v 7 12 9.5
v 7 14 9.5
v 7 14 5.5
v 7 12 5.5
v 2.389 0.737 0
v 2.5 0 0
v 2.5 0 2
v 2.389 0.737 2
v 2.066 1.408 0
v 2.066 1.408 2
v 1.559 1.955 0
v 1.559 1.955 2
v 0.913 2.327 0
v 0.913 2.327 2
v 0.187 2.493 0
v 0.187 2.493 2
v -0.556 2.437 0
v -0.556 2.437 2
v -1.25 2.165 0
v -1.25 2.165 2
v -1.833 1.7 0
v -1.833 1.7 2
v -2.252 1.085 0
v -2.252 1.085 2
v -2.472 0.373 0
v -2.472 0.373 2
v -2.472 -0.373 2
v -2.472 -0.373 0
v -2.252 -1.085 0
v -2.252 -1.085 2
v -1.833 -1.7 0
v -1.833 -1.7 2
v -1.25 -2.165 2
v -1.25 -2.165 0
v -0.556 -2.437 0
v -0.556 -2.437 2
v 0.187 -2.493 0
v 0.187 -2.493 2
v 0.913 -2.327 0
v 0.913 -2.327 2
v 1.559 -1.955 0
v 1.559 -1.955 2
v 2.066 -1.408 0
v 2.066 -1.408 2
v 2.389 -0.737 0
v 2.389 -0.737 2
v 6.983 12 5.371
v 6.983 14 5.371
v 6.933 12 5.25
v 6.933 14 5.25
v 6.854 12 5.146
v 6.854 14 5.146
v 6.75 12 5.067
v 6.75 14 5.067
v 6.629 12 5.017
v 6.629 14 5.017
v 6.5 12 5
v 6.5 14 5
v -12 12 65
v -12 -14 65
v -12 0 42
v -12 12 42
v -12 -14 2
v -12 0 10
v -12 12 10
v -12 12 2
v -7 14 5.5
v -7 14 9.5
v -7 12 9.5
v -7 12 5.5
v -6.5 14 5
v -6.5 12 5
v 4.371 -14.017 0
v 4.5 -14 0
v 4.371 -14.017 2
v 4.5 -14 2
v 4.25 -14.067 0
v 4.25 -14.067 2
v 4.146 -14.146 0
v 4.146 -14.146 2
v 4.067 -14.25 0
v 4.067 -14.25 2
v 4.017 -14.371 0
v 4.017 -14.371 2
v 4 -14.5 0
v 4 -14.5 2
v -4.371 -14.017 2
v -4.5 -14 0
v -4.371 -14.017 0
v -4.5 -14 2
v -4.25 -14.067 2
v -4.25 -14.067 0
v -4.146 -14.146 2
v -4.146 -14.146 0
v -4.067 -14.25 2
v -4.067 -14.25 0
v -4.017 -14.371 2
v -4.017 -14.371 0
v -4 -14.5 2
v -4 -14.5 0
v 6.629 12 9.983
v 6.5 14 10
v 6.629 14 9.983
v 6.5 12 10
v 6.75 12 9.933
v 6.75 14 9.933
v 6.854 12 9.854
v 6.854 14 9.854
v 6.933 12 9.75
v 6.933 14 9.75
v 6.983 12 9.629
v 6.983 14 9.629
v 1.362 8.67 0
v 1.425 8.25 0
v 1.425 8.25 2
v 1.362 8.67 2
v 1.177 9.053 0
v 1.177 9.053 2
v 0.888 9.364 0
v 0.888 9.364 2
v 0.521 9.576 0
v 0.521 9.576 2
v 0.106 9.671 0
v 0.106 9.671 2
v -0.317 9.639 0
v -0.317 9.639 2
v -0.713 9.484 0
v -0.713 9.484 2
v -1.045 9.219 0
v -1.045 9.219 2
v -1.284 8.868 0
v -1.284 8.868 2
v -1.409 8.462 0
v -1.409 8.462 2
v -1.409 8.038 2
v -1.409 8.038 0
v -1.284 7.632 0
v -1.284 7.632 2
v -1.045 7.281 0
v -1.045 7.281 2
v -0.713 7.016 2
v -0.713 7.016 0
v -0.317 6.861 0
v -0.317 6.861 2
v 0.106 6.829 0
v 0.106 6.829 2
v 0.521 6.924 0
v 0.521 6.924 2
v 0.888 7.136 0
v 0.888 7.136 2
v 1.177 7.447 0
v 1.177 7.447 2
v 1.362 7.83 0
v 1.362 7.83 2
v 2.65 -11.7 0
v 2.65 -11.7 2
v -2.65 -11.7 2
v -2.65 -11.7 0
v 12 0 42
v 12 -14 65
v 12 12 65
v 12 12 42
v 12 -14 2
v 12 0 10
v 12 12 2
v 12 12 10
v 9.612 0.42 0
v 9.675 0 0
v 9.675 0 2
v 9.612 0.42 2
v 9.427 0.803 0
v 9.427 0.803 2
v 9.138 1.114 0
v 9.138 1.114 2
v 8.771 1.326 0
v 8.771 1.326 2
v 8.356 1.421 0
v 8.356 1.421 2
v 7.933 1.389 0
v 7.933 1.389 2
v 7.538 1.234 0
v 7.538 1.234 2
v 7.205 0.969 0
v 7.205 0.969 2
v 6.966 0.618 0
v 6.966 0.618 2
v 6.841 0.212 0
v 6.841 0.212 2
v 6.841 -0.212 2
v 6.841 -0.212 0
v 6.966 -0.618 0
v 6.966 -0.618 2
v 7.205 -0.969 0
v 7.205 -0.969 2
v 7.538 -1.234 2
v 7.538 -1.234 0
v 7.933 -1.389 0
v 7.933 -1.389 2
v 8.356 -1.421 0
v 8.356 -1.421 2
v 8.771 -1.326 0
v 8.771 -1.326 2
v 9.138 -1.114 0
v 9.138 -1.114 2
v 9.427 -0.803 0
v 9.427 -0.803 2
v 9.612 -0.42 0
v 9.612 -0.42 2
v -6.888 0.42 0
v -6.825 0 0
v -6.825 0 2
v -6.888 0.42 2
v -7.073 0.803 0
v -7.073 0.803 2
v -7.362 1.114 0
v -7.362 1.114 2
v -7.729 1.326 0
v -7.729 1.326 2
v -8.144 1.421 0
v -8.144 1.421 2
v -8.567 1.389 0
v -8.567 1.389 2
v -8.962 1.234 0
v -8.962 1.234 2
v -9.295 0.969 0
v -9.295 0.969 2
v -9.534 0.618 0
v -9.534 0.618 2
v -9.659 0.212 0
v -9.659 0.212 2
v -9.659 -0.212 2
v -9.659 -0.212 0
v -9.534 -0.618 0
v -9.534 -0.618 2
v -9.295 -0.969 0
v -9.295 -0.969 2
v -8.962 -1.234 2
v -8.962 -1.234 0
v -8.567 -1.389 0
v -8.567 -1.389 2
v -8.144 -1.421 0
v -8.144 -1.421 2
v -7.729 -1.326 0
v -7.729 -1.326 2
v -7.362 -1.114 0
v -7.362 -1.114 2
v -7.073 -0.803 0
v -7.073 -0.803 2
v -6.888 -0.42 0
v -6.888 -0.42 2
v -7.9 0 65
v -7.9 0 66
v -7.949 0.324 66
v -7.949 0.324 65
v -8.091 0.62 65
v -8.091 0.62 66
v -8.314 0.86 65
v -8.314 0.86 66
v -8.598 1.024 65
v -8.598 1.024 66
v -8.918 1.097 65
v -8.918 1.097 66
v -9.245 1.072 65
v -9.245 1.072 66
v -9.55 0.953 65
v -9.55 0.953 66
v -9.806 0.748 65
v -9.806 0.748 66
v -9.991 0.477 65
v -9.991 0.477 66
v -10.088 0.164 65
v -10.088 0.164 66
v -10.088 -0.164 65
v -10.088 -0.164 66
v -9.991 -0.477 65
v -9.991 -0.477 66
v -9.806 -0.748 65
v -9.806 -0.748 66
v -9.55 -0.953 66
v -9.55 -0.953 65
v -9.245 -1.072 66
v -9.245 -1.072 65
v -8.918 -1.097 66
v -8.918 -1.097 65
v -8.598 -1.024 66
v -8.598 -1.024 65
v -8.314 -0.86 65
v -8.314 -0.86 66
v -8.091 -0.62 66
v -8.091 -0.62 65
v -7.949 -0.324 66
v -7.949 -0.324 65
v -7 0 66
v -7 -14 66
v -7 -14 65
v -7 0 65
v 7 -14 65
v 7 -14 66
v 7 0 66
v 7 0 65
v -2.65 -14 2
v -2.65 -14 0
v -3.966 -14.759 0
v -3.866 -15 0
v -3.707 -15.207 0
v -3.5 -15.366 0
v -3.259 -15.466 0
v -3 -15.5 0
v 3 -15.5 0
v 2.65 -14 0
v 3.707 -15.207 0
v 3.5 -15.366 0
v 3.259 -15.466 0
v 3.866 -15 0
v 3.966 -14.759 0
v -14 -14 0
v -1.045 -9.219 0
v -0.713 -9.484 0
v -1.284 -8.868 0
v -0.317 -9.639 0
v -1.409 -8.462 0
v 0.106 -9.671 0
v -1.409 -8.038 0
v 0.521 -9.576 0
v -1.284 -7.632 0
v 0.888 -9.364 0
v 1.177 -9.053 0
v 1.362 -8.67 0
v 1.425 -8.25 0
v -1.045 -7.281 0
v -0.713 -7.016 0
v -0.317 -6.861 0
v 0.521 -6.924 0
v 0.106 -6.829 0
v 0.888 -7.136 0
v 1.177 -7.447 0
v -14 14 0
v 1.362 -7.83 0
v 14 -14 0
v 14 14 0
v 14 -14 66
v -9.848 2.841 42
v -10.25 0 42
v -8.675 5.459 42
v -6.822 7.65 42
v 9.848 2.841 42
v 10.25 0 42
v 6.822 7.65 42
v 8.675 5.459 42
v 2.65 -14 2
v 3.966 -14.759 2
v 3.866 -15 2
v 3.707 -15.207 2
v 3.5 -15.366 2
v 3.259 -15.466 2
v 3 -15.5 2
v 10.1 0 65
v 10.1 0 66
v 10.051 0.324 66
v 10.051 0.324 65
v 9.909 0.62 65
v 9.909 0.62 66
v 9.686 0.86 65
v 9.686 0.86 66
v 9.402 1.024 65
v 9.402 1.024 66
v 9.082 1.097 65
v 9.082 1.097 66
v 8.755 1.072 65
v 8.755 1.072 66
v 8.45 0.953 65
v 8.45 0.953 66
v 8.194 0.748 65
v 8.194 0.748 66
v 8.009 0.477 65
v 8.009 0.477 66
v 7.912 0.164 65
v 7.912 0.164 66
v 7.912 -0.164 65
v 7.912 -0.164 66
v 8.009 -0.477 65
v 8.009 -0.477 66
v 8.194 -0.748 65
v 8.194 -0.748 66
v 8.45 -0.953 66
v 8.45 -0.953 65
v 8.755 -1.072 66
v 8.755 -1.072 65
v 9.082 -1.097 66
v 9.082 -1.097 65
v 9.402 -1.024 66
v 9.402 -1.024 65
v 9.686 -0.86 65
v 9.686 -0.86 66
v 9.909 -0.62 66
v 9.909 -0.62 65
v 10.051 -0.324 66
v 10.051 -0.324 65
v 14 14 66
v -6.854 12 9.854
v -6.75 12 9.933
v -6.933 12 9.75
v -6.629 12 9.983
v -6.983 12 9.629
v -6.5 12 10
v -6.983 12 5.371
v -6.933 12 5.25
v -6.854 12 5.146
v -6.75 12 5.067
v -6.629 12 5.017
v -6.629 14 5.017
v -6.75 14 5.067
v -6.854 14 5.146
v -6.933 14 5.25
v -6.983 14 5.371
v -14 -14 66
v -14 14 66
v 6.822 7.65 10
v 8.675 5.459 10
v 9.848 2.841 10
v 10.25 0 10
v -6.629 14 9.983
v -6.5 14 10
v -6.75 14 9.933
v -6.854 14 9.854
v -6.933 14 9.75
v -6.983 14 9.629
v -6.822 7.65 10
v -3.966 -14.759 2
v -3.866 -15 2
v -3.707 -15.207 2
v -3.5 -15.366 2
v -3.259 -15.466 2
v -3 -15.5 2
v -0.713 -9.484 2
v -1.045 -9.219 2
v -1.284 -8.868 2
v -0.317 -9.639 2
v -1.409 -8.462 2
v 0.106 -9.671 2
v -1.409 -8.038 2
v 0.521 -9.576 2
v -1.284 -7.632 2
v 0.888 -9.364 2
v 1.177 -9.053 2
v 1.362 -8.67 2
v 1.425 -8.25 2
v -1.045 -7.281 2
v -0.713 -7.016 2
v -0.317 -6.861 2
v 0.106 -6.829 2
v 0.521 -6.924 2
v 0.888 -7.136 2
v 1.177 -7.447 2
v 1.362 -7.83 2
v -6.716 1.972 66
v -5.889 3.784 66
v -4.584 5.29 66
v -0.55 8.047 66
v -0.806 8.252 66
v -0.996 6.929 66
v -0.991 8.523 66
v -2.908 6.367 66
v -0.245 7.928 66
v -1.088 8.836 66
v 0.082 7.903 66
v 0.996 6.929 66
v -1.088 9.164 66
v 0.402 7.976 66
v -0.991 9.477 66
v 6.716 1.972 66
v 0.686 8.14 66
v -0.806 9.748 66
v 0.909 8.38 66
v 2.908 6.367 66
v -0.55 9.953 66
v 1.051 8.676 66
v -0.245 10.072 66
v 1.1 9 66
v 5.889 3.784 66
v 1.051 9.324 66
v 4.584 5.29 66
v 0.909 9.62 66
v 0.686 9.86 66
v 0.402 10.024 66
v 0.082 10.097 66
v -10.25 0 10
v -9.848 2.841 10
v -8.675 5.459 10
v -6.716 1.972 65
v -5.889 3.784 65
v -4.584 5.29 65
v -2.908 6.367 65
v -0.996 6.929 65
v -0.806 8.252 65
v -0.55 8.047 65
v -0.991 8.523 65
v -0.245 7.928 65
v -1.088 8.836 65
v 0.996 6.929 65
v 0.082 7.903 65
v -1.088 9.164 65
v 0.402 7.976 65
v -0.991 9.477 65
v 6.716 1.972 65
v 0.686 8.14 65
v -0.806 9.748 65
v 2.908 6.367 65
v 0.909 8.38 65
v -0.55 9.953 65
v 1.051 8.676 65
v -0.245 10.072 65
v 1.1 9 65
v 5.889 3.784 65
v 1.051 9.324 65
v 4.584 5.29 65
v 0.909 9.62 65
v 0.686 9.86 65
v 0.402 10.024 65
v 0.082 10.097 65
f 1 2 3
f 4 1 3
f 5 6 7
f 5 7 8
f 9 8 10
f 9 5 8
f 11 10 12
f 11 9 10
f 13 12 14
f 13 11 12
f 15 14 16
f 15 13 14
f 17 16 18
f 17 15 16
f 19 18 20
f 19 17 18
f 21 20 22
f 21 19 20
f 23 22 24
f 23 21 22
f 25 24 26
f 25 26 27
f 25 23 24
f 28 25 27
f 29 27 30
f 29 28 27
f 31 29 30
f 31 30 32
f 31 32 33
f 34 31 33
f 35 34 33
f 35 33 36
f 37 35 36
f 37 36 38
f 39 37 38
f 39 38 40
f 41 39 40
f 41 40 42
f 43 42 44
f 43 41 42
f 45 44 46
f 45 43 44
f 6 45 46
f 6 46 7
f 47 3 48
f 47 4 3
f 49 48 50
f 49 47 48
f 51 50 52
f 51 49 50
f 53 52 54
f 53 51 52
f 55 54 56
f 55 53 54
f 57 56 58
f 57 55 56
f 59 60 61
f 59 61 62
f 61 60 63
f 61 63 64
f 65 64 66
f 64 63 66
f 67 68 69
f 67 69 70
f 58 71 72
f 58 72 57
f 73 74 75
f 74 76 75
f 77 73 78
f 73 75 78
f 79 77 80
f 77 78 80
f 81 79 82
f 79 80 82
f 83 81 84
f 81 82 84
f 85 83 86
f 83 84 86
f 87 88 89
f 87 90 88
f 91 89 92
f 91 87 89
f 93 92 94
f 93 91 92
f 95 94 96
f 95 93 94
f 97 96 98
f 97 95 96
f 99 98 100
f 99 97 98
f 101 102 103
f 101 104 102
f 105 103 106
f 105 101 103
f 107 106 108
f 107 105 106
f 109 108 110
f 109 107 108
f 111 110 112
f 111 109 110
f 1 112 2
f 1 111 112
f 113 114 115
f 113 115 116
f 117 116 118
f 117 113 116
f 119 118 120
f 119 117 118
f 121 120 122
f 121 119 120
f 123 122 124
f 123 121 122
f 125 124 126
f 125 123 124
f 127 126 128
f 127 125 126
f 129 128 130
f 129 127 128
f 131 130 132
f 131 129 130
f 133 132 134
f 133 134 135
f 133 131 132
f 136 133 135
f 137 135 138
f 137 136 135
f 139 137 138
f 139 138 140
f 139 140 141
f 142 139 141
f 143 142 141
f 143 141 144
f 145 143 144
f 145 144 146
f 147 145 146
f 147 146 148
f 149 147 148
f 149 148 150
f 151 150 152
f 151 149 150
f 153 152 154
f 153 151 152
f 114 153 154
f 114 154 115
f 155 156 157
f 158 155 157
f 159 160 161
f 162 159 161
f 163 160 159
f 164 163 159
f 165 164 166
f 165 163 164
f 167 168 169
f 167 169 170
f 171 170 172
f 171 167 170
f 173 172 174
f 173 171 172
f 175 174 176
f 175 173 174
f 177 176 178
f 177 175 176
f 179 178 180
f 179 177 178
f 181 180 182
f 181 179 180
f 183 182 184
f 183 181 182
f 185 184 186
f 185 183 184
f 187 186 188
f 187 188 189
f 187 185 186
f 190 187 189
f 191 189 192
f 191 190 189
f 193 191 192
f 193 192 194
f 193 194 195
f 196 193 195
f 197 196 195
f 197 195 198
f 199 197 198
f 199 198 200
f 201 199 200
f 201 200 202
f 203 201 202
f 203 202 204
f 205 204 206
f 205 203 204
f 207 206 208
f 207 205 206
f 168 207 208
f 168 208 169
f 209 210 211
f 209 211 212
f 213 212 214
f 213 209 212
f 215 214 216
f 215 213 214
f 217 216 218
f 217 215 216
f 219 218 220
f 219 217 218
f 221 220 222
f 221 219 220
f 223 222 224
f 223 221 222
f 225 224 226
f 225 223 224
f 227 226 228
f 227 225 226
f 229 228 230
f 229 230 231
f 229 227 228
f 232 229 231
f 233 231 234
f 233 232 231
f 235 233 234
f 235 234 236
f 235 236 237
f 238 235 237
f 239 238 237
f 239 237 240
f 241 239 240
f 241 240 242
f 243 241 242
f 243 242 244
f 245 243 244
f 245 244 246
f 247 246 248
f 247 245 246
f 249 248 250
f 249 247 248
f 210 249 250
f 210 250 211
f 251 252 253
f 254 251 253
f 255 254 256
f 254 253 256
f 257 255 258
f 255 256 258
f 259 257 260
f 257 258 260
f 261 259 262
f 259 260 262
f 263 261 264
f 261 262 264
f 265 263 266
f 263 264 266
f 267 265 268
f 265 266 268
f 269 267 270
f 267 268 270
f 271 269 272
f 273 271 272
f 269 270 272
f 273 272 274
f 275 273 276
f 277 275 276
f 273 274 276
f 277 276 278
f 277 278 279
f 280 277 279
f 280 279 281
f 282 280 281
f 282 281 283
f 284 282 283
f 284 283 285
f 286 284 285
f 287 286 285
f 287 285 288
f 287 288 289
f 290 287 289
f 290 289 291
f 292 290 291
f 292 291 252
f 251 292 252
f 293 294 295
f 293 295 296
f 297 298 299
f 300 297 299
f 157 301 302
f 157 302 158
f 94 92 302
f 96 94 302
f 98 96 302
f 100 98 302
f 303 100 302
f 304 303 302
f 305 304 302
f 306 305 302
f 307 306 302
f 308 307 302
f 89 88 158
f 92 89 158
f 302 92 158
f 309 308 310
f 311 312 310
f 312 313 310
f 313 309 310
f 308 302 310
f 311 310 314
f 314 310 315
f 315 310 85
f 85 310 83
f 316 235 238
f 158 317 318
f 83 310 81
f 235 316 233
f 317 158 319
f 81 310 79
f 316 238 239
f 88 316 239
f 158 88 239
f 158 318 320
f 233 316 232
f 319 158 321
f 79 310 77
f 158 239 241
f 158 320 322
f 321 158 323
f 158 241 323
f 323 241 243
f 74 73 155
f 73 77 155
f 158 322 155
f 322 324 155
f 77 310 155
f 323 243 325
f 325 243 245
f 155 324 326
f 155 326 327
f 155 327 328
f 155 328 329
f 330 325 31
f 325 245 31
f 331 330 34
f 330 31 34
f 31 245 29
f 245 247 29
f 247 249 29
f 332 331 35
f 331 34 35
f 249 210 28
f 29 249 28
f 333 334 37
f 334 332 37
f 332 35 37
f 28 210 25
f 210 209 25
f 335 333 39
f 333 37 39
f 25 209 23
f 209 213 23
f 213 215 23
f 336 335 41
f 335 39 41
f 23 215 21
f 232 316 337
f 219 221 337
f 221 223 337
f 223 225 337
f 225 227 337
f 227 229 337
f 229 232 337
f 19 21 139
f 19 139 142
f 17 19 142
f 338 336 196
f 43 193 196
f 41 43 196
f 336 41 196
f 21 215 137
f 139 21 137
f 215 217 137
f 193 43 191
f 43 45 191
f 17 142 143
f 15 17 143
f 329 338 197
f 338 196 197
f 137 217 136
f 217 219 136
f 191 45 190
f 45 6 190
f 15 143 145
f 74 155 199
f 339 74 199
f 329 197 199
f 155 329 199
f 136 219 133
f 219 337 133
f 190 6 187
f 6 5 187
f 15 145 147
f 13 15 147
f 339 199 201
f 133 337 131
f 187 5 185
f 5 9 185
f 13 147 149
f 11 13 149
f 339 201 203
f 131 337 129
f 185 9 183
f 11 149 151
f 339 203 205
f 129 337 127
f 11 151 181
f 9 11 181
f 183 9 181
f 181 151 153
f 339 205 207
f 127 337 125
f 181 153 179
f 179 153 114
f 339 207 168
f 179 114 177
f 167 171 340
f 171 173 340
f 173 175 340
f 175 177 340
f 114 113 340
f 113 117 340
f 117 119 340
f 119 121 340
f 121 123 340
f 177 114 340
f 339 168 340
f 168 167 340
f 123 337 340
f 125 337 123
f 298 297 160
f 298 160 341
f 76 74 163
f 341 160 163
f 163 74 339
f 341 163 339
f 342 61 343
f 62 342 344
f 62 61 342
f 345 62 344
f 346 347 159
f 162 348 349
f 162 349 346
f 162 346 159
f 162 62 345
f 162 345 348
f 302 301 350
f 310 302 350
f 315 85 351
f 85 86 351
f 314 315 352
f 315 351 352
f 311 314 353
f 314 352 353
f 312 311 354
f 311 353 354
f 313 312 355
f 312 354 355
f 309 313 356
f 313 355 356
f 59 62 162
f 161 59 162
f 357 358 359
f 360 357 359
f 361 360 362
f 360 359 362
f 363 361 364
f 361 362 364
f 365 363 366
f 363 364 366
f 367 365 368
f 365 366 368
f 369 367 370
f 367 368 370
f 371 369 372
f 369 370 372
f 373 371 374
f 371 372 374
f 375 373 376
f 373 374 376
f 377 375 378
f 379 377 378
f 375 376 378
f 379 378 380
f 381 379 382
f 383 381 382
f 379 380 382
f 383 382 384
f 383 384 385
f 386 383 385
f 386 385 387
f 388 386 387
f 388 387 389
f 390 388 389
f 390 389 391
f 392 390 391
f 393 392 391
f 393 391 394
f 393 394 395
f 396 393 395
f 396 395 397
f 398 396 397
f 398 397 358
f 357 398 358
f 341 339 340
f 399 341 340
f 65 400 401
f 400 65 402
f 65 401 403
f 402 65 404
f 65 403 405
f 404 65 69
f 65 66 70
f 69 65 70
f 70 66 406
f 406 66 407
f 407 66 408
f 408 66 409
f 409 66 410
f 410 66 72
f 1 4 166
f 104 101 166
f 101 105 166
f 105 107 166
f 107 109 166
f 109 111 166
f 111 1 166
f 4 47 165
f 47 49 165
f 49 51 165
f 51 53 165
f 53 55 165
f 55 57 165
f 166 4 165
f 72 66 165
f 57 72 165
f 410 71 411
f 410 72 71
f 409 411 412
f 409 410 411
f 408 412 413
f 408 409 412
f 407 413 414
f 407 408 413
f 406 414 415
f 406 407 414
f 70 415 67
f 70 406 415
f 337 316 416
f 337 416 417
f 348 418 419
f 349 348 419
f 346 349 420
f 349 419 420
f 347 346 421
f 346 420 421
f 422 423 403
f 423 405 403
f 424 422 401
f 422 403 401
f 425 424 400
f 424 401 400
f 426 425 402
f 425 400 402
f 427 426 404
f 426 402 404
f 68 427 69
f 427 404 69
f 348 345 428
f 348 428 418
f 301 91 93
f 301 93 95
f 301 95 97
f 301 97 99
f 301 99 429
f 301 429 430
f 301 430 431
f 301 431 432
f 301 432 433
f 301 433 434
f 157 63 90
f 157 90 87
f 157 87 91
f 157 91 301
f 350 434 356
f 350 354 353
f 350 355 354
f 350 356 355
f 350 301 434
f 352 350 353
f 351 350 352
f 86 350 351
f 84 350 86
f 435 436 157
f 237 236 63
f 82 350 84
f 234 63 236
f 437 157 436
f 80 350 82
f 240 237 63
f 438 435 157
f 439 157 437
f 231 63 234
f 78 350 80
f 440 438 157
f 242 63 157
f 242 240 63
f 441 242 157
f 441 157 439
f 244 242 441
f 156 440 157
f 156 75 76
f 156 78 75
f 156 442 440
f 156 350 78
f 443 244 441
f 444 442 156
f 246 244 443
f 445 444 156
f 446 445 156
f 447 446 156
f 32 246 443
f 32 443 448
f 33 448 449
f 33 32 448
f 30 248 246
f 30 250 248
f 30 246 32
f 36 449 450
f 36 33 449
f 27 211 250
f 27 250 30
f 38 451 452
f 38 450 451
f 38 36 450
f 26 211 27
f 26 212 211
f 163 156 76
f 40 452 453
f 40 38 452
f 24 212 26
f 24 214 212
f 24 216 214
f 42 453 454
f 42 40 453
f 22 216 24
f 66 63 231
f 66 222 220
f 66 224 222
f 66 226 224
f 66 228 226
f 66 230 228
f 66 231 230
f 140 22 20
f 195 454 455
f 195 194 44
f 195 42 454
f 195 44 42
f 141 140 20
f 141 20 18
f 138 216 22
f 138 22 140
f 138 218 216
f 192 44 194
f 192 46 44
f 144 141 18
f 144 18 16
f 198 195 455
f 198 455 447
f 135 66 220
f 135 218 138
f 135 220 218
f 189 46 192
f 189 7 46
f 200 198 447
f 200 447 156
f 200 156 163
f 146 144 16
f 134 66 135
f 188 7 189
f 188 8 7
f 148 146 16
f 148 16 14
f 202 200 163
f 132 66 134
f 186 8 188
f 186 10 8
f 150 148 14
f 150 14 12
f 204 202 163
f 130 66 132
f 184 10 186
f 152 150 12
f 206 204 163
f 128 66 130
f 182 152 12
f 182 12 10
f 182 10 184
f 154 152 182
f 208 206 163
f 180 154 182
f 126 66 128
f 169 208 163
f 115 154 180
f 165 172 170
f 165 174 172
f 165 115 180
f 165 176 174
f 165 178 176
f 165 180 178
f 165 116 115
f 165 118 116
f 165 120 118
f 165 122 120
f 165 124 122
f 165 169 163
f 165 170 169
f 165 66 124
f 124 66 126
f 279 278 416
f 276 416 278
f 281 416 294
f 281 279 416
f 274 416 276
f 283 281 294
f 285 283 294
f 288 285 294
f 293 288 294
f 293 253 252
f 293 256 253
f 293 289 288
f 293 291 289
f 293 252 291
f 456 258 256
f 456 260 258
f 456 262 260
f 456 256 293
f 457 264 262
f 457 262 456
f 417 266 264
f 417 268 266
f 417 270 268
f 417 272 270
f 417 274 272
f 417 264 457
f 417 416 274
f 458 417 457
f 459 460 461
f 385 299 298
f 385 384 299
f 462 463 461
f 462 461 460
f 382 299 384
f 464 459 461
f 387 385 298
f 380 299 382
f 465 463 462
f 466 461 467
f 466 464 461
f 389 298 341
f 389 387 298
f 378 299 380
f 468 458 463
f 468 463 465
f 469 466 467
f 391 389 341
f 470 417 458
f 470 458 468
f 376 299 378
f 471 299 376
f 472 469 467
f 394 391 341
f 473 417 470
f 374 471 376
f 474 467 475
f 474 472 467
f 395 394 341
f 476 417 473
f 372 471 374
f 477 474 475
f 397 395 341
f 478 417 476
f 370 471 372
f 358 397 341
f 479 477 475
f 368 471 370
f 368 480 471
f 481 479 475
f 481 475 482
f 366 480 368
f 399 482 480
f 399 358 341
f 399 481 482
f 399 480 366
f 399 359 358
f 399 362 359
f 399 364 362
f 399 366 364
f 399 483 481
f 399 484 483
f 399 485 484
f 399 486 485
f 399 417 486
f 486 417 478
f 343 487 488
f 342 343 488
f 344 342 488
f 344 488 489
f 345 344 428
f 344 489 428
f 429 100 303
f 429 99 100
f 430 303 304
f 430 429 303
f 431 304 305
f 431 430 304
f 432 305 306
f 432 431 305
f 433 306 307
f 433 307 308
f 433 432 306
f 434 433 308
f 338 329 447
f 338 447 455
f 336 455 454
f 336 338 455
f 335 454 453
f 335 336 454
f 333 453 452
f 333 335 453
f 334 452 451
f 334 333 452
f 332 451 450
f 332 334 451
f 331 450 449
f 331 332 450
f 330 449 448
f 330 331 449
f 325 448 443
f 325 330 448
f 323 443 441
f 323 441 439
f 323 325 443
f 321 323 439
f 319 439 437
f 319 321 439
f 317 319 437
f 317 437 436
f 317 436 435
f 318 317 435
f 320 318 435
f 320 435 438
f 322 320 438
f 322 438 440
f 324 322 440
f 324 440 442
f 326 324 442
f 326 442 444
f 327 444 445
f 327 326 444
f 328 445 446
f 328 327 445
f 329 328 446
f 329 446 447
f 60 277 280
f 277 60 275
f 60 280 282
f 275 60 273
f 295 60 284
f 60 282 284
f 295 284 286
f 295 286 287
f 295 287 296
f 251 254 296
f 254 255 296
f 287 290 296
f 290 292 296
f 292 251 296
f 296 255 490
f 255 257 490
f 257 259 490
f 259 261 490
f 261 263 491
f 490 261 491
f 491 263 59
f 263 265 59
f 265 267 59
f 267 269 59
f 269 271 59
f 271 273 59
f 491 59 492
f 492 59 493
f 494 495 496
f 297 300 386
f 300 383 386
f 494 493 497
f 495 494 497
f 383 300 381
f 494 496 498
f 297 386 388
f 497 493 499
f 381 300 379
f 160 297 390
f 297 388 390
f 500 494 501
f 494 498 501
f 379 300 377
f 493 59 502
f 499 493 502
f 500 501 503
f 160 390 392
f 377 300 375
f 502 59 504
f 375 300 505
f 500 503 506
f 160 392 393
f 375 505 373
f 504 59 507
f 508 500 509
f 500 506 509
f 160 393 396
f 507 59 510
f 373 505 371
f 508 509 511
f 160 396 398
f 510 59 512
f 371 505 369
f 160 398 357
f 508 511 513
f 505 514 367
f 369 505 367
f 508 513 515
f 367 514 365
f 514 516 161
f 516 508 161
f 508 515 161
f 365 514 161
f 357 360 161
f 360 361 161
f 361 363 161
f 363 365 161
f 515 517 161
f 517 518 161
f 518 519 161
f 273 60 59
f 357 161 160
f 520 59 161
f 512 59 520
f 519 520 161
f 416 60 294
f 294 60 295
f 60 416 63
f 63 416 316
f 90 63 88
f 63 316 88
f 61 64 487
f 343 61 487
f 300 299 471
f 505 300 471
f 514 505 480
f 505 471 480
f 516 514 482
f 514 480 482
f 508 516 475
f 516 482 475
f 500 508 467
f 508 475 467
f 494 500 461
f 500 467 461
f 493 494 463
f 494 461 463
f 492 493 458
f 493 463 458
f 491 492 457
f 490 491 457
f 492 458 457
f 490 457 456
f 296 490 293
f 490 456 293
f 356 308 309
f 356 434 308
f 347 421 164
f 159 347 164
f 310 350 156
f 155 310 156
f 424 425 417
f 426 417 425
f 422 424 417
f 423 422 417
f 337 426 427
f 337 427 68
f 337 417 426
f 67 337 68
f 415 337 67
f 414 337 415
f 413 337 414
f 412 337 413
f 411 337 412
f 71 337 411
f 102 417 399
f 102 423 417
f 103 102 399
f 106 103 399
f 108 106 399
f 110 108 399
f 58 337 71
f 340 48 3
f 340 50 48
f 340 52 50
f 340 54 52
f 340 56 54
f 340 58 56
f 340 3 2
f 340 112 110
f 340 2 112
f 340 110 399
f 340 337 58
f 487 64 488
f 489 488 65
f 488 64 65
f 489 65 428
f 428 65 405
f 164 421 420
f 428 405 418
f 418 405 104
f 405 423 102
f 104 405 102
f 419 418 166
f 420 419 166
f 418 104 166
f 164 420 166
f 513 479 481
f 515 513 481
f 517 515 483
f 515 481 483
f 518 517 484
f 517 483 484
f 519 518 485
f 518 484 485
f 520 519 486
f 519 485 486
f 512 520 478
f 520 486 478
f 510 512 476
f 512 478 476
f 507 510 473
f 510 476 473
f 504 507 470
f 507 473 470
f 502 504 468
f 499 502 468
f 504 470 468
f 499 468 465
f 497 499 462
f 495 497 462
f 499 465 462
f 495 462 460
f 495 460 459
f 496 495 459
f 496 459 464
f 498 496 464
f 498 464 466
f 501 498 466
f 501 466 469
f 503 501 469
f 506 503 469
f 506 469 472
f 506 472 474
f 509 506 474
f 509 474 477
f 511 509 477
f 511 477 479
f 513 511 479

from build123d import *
from OCP.BRepFilletAPI import BRepFilletAPI_MakeFillet

# Parameters (mm, degrees)
SKETCH1_W                 = 28
SKETCH1_H                 = 28
BOSS_EXTRUDE1_DEPTH       = 66
SHELL1_T                  = -2
SHELL1_THICKNESS_2_FACE_W = 24
SHELL1_THICKNESS_2_FACE_H = 26
SHELL1_THICKNESS_2_DEPTH  = 1
SKETCH2_R                 = 2.5
SKETCH2_R_2               = 1.425
CUT_EXTRUDE4_DEPTH        = 2
SKETCH5_W                 = 14
SKETCH5_H                 = 5
CUT_EXTRUDE6_DEPTH        = 10
SKETCH6_R                 = 7
SKETCH6_R_2               = 1.1
CUT_EXTRUDE8_DEPTH        = 10
FILLET1_R                 = 0.5
BOSS_EXTRUDE2_START       = 8
BOSS_EXTRUDE2_DEPTH       = 32
SKETCH16_W                = 4
SKETCH16_H                = 2
BOSS_EXTRUDE9_DEPTH       = 1.5
SKETCH17_W                = 2.65
SKETCH17_H                = 2.3
CUT_EXTRUDE9_DEPTH        = 3
FILLET3_R                 = 1
FILLET3_R_2               = 0.5
CUT_EXTRUDE10_REACH       = 71.226
SKETCH18_W                = 14
SKETCH18_H                = 14


with BuildPart() as part:
    # Sketch1 → Boss-Extrude1 (new body)
    with BuildSketch(Plane.XY):
        Rectangle(SKETCH1_W, SKETCH1_H)
    extrude(amount=BOSS_EXTRUDE1_DEPTH)

    # Shell1
    shell1_openings = [part.faces().sort_by_distance(p)[0] for p in [
        (0, -14, 33),
    ]]
    offset(amount=SHELL1_T, openings=shell1_openings, kind=Kind.INTERSECTION)

    # Shell1 thickness 2 face (on inner face of the shell) → Shell1 thickness 2 (cut)
    with BuildSketch(Plane(origin=(0, -1, 64), x_dir=(1, 0, 0), z_dir=(0, 0, 1))):
        Rectangle(SHELL1_THICKNESS_2_FACE_W, SHELL1_THICKNESS_2_FACE_H)
    extrude(amount=SHELL1_THICKNESS_2_DEPTH, mode=Mode.SUBTRACT)

    # Sketch2 → Cut-Extrude4 (cut)
    with BuildSketch(Plane.XY):
        Circle(SKETCH2_R)
        with Locations((8.25, 0)):
            Circle(SKETCH2_R_2)
        with Locations((0, -8.25)):
            Circle(SKETCH2_R_2)
        with Locations((-8.25, 0)):
            Circle(SKETCH2_R_2)
        with Locations((0, 8.25)):
            Circle(SKETCH2_R_2)
    extrude(amount=CUT_EXTRUDE4_DEPTH, mode=Mode.SUBTRACT)

    # Sketch5 → Cut-Extrude6 (cut)
    with BuildSketch(Plane(origin=(0, 14, 0), x_dir=(1, 0, 0), z_dir=(0, 1, 0))):
        with Locations((0, -7.5)):
            Rectangle(SKETCH5_W, SKETCH5_H)
    extrude(amount=-CUT_EXTRUDE6_DEPTH, mode=Mode.SUBTRACT)

    # Sketch6 → Cut-Extrude8 (cut)
    with BuildSketch(Plane.XY.offset(66)):
        Circle(SKETCH6_R)
        with Locations((0, 9)):
            Circle(SKETCH6_R_2)
        with Locations((9, 0)):
            Circle(SKETCH6_R_2)
        with Locations((0, -9)):
            Circle(SKETCH6_R_2)
        with Locations((-9, 0)):
            Circle(SKETCH6_R_2)
    extrude(amount=-CUT_EXTRUDE8_DEPTH, mode=Mode.SUBTRACT)

    # Fillet1
    fillet1_edges = [part.edges().sort_by_distance(p)[0] for p in [
        (-7, 13, 5),
        (7, 13, 5),
        (7, 13, 10),
        (-7, 13, 10),
    ]]
    fillet(fillet1_edges, radius=FILLET1_R)

    # Sketch9 → Boss-Extrude2 (add)
    with BuildSketch(Plane.XY.offset(2).offset(BOSS_EXTRUDE2_START)):
        with BuildLine():
            ThreePointArc((6.82202316, 7.65), (9.353829093, 4.191465293), (10.25, 0))
            Line((10.25, 0), (12, 0))
            Line((12, 0), (12, 12))
            Line((12, 12), (-12, 12))
            Line((-12, 12), (-12, 0))
            Line((-12, 0), (-10.25, 0))
            ThreePointArc((-10.25, 0), (-9.353829093, 4.191465293), (-6.82202316, 7.65))
            ThreePointArc((-6.82202316, 7.65), (0, 10.25), (6.82202316, 7.65))
        make_face()
        with BuildLine():
            Line((-6.82202316, 7.65), (-1.292526595, 7.65))
            ThreePointArc((-1.292526595, 7.65), (-0.307225163, 9.641487585), (1.425, 8.25))
            ThreePointArc((1.425, 8.25), (1.391487585, 7.942774837), (1.292526595, 7.65))
            Line((1.292526595, 7.65), (6.82202316, 7.65))
            ThreePointArc((6.82202316, 7.65), (0, 10.25), (-6.82202316, 7.65))
        make_face()
        with BuildLine():
            Line((-1.292526595, 7.65), (0, 7.65))
            Line((0, 7.65), (1.292526595, 7.65))
            ThreePointArc((1.292526595, 7.65), (1.391487585, 7.942774837), (1.425, 8.25))
            ThreePointArc((1.425, 8.25), (-0.307225163, 9.641487585), (-1.292526595, 7.65))
        make_face()
    extrude(amount=BOSS_EXTRUDE2_DEPTH)

    # Sketch16 → Boss-Extrude9 (add)
    with BuildSketch(Plane.XZ.offset(14)):
        with Locations((-2, 1)):
            Rectangle(SKETCH16_W, SKETCH16_H)
        with Locations((2, 1)):
            Rectangle(SKETCH16_W, SKETCH16_H)
    extrude(amount=BOSS_EXTRUDE9_DEPTH)

    # Sketch17 → Cut-Extrude9 (cut)
    with BuildSketch(Plane.XY.offset(2)):
        with Locations((1.325, -12.85)):
            Rectangle(SKETCH17_W, SKETCH17_H)
        with Locations((-1.325, -12.85)):
            Rectangle(SKETCH17_W, SKETCH17_H)
    extrude(amount=-CUT_EXTRUDE9_DEPTH, mode=Mode.SUBTRACT)

    # Fillet3
    fillet3_edges_1 = [part.edges().sort_by_distance(p)[0] for p in [
        (-4, -15.5, 1),
        (4, -15.5, 1),
    ]]
    fillet3_edges_2 = [part.edges().sort_by_distance(p)[0] for p in [
        (4, -14, 1),
        (-4, -14, 1),
    ]]
    fillet3 = BRepFilletAPI_MakeFillet(part.part.solid().wrapped)
    for e in fillet3_edges_1:
        fillet3.Add(FILLET3_R - 0.0001, e.wrapped)
    for e in fillet3_edges_2:
        fillet3.Add(FILLET3_R_2 - 0.0001, e.wrapped)
    add(Compound.cast(fillet3.Shape()), mode=Mode.REPLACE)  # a hair under: the kernel refuses the full size

    # Sketch18 → Cut-Extrude10 (cut, up to next)
    with BuildSketch(Plane.XY.offset(66), mode=Mode.PRIVATE) as cut_extrude10_sk1:
        with Locations((0, -7)):
            Rectangle(SKETCH18_W, SKETCH18_H)
    cut_extrude10_tool1 = extrude(cut_extrude10_sk1.sketch, amount=-CUT_EXTRUDE10_REACH, mode=Mode.PRIVATE) & part.part
    add(cut_extrude10_tool1.solids().sort_by_distance((0, -7, 66))[0], mode=Mode.SUBTRACT)


solid = part.part
